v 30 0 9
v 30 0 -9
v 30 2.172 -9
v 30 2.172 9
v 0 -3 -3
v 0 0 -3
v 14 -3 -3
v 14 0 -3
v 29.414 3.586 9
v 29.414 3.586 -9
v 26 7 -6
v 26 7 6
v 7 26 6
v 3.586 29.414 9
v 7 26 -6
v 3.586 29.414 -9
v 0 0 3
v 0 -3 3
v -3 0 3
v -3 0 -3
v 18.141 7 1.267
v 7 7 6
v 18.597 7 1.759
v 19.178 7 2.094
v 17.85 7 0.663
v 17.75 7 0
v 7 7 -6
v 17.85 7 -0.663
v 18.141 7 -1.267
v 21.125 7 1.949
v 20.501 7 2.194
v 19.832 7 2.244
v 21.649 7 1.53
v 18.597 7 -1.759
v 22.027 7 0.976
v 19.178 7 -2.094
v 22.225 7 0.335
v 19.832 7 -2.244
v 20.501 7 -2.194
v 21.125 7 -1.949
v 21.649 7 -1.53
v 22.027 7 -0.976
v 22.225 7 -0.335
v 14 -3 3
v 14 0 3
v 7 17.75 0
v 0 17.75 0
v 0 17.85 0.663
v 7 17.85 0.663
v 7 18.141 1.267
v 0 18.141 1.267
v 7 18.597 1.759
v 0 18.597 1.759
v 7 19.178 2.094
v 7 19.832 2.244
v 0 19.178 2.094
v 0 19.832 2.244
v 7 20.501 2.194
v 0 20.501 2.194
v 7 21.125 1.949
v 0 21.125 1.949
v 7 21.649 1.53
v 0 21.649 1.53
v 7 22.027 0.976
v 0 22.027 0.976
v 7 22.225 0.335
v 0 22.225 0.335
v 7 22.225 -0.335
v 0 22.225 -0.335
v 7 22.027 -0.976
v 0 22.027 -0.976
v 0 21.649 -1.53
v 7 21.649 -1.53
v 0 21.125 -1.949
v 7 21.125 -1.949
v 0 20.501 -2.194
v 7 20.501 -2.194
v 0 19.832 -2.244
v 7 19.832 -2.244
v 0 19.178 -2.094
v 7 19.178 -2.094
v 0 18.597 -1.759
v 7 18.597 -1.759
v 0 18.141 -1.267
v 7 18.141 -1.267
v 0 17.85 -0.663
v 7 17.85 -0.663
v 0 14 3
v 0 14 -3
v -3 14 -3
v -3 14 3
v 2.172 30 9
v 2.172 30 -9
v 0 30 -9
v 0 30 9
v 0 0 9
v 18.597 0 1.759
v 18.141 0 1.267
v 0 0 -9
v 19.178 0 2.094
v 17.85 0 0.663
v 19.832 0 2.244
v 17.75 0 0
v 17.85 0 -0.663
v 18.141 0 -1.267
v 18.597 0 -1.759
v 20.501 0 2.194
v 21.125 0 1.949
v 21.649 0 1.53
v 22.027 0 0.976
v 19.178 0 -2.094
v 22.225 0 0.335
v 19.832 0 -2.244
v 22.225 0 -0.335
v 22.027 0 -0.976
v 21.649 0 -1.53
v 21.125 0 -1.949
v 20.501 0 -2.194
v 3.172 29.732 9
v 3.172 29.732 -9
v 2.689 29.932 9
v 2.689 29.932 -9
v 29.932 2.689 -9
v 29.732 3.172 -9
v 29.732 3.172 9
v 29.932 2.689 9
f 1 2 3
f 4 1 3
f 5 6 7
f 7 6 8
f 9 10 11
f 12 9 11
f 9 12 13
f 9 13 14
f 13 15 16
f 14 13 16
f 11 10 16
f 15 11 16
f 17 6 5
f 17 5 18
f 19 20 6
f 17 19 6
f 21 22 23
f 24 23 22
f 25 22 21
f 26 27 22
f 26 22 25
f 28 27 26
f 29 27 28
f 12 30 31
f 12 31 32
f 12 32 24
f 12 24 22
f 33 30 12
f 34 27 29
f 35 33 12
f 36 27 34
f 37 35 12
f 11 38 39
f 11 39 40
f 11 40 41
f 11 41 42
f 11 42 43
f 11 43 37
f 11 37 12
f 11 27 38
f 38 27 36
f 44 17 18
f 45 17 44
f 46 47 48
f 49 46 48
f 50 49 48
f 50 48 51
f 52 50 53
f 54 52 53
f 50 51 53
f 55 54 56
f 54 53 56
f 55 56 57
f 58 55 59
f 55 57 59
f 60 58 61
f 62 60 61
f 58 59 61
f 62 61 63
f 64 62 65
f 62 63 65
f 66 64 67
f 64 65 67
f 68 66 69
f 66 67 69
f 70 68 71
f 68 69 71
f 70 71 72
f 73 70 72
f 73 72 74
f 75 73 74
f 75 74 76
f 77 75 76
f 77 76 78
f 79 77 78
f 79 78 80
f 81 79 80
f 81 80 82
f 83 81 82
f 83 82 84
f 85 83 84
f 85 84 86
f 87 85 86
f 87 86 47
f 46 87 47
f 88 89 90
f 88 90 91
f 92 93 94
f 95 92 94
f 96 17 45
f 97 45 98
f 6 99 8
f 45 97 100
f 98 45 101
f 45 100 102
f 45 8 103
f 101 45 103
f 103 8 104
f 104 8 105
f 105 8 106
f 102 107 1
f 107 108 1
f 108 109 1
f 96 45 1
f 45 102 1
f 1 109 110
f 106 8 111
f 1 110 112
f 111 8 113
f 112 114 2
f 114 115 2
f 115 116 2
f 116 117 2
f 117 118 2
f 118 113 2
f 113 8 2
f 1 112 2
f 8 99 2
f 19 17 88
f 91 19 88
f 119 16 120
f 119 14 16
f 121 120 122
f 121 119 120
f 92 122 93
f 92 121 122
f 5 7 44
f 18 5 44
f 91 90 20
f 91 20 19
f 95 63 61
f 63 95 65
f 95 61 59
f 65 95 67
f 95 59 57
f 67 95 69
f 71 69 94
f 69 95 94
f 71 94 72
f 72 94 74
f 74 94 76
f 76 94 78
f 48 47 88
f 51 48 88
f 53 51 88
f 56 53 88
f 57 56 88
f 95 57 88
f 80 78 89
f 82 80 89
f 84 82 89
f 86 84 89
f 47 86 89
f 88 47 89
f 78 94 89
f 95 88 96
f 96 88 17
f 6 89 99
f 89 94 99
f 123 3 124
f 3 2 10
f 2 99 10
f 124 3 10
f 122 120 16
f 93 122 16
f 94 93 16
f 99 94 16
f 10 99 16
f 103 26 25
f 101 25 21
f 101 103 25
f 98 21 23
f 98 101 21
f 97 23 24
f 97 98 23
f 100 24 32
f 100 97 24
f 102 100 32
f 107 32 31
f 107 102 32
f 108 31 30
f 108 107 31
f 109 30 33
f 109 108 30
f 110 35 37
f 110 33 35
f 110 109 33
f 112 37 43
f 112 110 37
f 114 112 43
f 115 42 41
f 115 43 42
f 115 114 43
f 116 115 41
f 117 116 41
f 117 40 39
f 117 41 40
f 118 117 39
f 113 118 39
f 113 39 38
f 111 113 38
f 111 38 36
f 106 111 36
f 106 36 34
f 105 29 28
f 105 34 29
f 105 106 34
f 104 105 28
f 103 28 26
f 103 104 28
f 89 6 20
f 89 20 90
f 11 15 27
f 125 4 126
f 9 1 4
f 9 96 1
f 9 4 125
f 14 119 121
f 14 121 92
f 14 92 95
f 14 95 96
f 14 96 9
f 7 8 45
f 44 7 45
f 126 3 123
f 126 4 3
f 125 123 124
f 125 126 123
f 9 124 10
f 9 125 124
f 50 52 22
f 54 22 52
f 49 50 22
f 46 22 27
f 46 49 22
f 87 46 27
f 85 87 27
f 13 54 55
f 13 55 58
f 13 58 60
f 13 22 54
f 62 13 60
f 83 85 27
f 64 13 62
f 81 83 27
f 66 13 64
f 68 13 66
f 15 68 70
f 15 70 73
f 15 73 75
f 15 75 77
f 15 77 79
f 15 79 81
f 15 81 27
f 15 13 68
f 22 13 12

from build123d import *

# Parameters (mm, degrees)
EXTRUDE_1_DEPTH      = 9
EXTRUDE_1_DEPTH_BACK = 9
SKETCH_6_R           = 2.25
CUT_EXTRUDE_1_DEPTH  = 44.370496884
SKETCH_7_W           = 20
SKETCH_7_H           = 12
CUT_EXTRUDE_2_DEPTH  = 23
SKETCH_8_W           = 6
SKETCH_8_H           = 14
EXTRUDE_2_DEPTH      = 3
FILLET_1_R           = 2


with BuildPart() as part:
    # Эскиз3 → Бобышка-Вытянуть1 (new, two sides: drawn at the far end of the back side and taken through both)
    with BuildSketch(Plane.XY.offset(-EXTRUDE_1_DEPTH_BACK)):
        Polygon((0, 0), (30, 0), (30, 3), (3, 30), (0, 30), align=None)
    extrude(amount=EXTRUDE_1_DEPTH + EXTRUDE_1_DEPTH_BACK)

    # Эскиз6 → Вырез-Вытянуть1 (cut, through all)
    with BuildSketch(Plane.ZY):
        with Locations((0, 20)):
            Circle(SKETCH_6_R)
    cut_extrude_1 = extrude(amount=-CUT_EXTRUDE_1_DEPTH, mode=Mode.SUBTRACT)

    # Эскиз7 → Вырез-Вытянуть2 (cut)
    with BuildSketch(Plane(origin=(0, 30, 0), x_dir=(1, 0, 0), z_dir=(0, 1, 0))):
        with Locations((17, 0)):
            Rectangle(SKETCH_7_W, SKETCH_7_H)
    extrude(amount=-CUT_EXTRUDE_2_DEPTH, mode=Mode.SUBTRACT)

    # Эскиз8 → Бобышка-Вытянуть2 (add)
    with BuildSketch(Plane.ZY):
        with Locations((0, 7)):
            Rectangle(SKETCH_8_W, SKETCH_8_H)
    extrude_2 = extrude(amount=EXTRUDE_2_DEPTH)

    # Зеркальное отражение1: Вырез-Вытянуть1, Бобышка-Вытянуть2 across plane
    add(cut_extrude_1.mirror(Plane(origin=(0, 0, 0), x_dir=(0, 0, 1), z_dir=(0.7071067811865476, -0.7071067811865475, 0))), mode=Mode.SUBTRACT)
    add(extrude_2.mirror(Plane(origin=(0, 0, 0), x_dir=(0, 0, 1), z_dir=(0.7071067811865476, -0.7071067811865475, 0))))

    # Скругление1
    fillet_1_edges = [part.edges().sort_by_distance(p)[0] for p in [
        (30, 3, 0),
        (3, 30, 0),
    ]]
    fillet(fillet_1_edges, radius=FILLET_1_R)


solid = part.part
